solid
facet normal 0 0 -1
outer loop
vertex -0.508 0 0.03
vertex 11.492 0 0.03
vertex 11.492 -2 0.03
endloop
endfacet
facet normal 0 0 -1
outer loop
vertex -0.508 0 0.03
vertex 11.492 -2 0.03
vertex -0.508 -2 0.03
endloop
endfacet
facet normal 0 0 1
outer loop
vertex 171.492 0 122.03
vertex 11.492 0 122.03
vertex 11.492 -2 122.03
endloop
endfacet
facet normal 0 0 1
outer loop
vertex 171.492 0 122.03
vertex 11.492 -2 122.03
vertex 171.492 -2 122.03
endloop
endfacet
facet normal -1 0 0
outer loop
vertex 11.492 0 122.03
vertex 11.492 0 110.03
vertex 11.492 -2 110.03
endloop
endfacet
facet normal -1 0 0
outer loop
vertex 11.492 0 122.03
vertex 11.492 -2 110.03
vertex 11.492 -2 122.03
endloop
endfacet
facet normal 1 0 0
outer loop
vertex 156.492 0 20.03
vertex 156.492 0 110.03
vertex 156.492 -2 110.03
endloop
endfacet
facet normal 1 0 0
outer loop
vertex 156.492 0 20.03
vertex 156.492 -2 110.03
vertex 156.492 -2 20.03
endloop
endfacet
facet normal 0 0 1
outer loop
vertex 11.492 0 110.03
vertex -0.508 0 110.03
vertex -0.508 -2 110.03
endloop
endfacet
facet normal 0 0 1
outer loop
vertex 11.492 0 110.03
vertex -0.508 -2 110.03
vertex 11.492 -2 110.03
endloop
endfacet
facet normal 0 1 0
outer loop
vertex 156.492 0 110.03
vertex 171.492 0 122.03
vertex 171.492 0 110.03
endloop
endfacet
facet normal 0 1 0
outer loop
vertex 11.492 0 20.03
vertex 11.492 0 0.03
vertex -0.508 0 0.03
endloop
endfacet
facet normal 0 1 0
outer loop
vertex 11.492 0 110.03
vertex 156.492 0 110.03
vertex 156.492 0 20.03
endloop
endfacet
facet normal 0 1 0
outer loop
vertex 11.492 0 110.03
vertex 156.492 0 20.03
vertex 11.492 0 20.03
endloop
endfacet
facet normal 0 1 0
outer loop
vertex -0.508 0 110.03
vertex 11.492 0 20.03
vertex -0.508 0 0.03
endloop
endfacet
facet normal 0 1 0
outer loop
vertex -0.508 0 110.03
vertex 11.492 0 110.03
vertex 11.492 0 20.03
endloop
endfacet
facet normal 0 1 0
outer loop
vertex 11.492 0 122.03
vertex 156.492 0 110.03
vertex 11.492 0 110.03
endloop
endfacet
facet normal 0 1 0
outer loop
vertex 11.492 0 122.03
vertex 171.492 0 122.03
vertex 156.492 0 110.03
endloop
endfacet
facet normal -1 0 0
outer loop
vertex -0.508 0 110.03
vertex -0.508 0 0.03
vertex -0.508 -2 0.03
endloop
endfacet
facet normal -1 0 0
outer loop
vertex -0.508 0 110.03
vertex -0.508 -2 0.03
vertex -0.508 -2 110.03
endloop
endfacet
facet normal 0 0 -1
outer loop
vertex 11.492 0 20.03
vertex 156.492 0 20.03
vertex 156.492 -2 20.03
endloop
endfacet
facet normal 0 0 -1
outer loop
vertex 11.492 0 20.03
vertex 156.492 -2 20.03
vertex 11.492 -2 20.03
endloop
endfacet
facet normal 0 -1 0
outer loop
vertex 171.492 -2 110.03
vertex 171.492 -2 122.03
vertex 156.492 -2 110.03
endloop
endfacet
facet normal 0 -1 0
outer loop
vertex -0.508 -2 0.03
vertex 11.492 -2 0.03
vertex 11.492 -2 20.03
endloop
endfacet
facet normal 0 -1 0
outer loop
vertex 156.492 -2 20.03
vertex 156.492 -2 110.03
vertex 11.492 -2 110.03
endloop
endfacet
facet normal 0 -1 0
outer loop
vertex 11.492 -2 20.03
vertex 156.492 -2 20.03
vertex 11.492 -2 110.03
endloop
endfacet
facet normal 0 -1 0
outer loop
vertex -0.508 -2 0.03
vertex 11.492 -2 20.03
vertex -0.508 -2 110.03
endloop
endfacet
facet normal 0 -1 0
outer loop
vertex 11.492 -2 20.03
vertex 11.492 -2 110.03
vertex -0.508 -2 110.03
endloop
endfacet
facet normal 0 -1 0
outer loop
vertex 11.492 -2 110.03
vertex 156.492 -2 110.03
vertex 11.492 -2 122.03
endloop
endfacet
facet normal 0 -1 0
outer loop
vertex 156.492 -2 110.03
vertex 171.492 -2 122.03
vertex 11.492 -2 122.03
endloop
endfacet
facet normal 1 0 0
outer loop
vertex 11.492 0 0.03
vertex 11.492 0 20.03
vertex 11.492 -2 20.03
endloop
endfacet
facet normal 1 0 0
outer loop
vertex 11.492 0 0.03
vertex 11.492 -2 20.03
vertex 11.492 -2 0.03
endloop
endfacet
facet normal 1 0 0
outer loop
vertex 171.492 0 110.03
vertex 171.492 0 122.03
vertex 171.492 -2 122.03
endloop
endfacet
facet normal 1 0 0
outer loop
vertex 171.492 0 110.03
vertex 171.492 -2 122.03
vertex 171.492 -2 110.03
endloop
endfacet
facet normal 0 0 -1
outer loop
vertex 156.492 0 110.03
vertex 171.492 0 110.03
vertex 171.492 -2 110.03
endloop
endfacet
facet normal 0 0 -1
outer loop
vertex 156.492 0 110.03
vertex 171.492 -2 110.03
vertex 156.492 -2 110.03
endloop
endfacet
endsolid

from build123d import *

# Parameters (mm, degrees)
PAD_DEPTH = 2


with BuildPart() as part:
    # Sketch → Pad (new body)
    with BuildSketch(Plane.XZ):
        Polygon((-0.507831, 0.029803), (-0.507831, 110.029803), (11.492169, 110.029803), (11.492169, 122.029803), (171.492169, 122.029803), (171.492169, 110.029803), (156.492169, 110.029803), (156.492169, 20.029803), (11.492169, 20.029803), (11.492169, 0.029803), align=None)
    extrude(amount=PAD_DEPTH)


solid = part.part
